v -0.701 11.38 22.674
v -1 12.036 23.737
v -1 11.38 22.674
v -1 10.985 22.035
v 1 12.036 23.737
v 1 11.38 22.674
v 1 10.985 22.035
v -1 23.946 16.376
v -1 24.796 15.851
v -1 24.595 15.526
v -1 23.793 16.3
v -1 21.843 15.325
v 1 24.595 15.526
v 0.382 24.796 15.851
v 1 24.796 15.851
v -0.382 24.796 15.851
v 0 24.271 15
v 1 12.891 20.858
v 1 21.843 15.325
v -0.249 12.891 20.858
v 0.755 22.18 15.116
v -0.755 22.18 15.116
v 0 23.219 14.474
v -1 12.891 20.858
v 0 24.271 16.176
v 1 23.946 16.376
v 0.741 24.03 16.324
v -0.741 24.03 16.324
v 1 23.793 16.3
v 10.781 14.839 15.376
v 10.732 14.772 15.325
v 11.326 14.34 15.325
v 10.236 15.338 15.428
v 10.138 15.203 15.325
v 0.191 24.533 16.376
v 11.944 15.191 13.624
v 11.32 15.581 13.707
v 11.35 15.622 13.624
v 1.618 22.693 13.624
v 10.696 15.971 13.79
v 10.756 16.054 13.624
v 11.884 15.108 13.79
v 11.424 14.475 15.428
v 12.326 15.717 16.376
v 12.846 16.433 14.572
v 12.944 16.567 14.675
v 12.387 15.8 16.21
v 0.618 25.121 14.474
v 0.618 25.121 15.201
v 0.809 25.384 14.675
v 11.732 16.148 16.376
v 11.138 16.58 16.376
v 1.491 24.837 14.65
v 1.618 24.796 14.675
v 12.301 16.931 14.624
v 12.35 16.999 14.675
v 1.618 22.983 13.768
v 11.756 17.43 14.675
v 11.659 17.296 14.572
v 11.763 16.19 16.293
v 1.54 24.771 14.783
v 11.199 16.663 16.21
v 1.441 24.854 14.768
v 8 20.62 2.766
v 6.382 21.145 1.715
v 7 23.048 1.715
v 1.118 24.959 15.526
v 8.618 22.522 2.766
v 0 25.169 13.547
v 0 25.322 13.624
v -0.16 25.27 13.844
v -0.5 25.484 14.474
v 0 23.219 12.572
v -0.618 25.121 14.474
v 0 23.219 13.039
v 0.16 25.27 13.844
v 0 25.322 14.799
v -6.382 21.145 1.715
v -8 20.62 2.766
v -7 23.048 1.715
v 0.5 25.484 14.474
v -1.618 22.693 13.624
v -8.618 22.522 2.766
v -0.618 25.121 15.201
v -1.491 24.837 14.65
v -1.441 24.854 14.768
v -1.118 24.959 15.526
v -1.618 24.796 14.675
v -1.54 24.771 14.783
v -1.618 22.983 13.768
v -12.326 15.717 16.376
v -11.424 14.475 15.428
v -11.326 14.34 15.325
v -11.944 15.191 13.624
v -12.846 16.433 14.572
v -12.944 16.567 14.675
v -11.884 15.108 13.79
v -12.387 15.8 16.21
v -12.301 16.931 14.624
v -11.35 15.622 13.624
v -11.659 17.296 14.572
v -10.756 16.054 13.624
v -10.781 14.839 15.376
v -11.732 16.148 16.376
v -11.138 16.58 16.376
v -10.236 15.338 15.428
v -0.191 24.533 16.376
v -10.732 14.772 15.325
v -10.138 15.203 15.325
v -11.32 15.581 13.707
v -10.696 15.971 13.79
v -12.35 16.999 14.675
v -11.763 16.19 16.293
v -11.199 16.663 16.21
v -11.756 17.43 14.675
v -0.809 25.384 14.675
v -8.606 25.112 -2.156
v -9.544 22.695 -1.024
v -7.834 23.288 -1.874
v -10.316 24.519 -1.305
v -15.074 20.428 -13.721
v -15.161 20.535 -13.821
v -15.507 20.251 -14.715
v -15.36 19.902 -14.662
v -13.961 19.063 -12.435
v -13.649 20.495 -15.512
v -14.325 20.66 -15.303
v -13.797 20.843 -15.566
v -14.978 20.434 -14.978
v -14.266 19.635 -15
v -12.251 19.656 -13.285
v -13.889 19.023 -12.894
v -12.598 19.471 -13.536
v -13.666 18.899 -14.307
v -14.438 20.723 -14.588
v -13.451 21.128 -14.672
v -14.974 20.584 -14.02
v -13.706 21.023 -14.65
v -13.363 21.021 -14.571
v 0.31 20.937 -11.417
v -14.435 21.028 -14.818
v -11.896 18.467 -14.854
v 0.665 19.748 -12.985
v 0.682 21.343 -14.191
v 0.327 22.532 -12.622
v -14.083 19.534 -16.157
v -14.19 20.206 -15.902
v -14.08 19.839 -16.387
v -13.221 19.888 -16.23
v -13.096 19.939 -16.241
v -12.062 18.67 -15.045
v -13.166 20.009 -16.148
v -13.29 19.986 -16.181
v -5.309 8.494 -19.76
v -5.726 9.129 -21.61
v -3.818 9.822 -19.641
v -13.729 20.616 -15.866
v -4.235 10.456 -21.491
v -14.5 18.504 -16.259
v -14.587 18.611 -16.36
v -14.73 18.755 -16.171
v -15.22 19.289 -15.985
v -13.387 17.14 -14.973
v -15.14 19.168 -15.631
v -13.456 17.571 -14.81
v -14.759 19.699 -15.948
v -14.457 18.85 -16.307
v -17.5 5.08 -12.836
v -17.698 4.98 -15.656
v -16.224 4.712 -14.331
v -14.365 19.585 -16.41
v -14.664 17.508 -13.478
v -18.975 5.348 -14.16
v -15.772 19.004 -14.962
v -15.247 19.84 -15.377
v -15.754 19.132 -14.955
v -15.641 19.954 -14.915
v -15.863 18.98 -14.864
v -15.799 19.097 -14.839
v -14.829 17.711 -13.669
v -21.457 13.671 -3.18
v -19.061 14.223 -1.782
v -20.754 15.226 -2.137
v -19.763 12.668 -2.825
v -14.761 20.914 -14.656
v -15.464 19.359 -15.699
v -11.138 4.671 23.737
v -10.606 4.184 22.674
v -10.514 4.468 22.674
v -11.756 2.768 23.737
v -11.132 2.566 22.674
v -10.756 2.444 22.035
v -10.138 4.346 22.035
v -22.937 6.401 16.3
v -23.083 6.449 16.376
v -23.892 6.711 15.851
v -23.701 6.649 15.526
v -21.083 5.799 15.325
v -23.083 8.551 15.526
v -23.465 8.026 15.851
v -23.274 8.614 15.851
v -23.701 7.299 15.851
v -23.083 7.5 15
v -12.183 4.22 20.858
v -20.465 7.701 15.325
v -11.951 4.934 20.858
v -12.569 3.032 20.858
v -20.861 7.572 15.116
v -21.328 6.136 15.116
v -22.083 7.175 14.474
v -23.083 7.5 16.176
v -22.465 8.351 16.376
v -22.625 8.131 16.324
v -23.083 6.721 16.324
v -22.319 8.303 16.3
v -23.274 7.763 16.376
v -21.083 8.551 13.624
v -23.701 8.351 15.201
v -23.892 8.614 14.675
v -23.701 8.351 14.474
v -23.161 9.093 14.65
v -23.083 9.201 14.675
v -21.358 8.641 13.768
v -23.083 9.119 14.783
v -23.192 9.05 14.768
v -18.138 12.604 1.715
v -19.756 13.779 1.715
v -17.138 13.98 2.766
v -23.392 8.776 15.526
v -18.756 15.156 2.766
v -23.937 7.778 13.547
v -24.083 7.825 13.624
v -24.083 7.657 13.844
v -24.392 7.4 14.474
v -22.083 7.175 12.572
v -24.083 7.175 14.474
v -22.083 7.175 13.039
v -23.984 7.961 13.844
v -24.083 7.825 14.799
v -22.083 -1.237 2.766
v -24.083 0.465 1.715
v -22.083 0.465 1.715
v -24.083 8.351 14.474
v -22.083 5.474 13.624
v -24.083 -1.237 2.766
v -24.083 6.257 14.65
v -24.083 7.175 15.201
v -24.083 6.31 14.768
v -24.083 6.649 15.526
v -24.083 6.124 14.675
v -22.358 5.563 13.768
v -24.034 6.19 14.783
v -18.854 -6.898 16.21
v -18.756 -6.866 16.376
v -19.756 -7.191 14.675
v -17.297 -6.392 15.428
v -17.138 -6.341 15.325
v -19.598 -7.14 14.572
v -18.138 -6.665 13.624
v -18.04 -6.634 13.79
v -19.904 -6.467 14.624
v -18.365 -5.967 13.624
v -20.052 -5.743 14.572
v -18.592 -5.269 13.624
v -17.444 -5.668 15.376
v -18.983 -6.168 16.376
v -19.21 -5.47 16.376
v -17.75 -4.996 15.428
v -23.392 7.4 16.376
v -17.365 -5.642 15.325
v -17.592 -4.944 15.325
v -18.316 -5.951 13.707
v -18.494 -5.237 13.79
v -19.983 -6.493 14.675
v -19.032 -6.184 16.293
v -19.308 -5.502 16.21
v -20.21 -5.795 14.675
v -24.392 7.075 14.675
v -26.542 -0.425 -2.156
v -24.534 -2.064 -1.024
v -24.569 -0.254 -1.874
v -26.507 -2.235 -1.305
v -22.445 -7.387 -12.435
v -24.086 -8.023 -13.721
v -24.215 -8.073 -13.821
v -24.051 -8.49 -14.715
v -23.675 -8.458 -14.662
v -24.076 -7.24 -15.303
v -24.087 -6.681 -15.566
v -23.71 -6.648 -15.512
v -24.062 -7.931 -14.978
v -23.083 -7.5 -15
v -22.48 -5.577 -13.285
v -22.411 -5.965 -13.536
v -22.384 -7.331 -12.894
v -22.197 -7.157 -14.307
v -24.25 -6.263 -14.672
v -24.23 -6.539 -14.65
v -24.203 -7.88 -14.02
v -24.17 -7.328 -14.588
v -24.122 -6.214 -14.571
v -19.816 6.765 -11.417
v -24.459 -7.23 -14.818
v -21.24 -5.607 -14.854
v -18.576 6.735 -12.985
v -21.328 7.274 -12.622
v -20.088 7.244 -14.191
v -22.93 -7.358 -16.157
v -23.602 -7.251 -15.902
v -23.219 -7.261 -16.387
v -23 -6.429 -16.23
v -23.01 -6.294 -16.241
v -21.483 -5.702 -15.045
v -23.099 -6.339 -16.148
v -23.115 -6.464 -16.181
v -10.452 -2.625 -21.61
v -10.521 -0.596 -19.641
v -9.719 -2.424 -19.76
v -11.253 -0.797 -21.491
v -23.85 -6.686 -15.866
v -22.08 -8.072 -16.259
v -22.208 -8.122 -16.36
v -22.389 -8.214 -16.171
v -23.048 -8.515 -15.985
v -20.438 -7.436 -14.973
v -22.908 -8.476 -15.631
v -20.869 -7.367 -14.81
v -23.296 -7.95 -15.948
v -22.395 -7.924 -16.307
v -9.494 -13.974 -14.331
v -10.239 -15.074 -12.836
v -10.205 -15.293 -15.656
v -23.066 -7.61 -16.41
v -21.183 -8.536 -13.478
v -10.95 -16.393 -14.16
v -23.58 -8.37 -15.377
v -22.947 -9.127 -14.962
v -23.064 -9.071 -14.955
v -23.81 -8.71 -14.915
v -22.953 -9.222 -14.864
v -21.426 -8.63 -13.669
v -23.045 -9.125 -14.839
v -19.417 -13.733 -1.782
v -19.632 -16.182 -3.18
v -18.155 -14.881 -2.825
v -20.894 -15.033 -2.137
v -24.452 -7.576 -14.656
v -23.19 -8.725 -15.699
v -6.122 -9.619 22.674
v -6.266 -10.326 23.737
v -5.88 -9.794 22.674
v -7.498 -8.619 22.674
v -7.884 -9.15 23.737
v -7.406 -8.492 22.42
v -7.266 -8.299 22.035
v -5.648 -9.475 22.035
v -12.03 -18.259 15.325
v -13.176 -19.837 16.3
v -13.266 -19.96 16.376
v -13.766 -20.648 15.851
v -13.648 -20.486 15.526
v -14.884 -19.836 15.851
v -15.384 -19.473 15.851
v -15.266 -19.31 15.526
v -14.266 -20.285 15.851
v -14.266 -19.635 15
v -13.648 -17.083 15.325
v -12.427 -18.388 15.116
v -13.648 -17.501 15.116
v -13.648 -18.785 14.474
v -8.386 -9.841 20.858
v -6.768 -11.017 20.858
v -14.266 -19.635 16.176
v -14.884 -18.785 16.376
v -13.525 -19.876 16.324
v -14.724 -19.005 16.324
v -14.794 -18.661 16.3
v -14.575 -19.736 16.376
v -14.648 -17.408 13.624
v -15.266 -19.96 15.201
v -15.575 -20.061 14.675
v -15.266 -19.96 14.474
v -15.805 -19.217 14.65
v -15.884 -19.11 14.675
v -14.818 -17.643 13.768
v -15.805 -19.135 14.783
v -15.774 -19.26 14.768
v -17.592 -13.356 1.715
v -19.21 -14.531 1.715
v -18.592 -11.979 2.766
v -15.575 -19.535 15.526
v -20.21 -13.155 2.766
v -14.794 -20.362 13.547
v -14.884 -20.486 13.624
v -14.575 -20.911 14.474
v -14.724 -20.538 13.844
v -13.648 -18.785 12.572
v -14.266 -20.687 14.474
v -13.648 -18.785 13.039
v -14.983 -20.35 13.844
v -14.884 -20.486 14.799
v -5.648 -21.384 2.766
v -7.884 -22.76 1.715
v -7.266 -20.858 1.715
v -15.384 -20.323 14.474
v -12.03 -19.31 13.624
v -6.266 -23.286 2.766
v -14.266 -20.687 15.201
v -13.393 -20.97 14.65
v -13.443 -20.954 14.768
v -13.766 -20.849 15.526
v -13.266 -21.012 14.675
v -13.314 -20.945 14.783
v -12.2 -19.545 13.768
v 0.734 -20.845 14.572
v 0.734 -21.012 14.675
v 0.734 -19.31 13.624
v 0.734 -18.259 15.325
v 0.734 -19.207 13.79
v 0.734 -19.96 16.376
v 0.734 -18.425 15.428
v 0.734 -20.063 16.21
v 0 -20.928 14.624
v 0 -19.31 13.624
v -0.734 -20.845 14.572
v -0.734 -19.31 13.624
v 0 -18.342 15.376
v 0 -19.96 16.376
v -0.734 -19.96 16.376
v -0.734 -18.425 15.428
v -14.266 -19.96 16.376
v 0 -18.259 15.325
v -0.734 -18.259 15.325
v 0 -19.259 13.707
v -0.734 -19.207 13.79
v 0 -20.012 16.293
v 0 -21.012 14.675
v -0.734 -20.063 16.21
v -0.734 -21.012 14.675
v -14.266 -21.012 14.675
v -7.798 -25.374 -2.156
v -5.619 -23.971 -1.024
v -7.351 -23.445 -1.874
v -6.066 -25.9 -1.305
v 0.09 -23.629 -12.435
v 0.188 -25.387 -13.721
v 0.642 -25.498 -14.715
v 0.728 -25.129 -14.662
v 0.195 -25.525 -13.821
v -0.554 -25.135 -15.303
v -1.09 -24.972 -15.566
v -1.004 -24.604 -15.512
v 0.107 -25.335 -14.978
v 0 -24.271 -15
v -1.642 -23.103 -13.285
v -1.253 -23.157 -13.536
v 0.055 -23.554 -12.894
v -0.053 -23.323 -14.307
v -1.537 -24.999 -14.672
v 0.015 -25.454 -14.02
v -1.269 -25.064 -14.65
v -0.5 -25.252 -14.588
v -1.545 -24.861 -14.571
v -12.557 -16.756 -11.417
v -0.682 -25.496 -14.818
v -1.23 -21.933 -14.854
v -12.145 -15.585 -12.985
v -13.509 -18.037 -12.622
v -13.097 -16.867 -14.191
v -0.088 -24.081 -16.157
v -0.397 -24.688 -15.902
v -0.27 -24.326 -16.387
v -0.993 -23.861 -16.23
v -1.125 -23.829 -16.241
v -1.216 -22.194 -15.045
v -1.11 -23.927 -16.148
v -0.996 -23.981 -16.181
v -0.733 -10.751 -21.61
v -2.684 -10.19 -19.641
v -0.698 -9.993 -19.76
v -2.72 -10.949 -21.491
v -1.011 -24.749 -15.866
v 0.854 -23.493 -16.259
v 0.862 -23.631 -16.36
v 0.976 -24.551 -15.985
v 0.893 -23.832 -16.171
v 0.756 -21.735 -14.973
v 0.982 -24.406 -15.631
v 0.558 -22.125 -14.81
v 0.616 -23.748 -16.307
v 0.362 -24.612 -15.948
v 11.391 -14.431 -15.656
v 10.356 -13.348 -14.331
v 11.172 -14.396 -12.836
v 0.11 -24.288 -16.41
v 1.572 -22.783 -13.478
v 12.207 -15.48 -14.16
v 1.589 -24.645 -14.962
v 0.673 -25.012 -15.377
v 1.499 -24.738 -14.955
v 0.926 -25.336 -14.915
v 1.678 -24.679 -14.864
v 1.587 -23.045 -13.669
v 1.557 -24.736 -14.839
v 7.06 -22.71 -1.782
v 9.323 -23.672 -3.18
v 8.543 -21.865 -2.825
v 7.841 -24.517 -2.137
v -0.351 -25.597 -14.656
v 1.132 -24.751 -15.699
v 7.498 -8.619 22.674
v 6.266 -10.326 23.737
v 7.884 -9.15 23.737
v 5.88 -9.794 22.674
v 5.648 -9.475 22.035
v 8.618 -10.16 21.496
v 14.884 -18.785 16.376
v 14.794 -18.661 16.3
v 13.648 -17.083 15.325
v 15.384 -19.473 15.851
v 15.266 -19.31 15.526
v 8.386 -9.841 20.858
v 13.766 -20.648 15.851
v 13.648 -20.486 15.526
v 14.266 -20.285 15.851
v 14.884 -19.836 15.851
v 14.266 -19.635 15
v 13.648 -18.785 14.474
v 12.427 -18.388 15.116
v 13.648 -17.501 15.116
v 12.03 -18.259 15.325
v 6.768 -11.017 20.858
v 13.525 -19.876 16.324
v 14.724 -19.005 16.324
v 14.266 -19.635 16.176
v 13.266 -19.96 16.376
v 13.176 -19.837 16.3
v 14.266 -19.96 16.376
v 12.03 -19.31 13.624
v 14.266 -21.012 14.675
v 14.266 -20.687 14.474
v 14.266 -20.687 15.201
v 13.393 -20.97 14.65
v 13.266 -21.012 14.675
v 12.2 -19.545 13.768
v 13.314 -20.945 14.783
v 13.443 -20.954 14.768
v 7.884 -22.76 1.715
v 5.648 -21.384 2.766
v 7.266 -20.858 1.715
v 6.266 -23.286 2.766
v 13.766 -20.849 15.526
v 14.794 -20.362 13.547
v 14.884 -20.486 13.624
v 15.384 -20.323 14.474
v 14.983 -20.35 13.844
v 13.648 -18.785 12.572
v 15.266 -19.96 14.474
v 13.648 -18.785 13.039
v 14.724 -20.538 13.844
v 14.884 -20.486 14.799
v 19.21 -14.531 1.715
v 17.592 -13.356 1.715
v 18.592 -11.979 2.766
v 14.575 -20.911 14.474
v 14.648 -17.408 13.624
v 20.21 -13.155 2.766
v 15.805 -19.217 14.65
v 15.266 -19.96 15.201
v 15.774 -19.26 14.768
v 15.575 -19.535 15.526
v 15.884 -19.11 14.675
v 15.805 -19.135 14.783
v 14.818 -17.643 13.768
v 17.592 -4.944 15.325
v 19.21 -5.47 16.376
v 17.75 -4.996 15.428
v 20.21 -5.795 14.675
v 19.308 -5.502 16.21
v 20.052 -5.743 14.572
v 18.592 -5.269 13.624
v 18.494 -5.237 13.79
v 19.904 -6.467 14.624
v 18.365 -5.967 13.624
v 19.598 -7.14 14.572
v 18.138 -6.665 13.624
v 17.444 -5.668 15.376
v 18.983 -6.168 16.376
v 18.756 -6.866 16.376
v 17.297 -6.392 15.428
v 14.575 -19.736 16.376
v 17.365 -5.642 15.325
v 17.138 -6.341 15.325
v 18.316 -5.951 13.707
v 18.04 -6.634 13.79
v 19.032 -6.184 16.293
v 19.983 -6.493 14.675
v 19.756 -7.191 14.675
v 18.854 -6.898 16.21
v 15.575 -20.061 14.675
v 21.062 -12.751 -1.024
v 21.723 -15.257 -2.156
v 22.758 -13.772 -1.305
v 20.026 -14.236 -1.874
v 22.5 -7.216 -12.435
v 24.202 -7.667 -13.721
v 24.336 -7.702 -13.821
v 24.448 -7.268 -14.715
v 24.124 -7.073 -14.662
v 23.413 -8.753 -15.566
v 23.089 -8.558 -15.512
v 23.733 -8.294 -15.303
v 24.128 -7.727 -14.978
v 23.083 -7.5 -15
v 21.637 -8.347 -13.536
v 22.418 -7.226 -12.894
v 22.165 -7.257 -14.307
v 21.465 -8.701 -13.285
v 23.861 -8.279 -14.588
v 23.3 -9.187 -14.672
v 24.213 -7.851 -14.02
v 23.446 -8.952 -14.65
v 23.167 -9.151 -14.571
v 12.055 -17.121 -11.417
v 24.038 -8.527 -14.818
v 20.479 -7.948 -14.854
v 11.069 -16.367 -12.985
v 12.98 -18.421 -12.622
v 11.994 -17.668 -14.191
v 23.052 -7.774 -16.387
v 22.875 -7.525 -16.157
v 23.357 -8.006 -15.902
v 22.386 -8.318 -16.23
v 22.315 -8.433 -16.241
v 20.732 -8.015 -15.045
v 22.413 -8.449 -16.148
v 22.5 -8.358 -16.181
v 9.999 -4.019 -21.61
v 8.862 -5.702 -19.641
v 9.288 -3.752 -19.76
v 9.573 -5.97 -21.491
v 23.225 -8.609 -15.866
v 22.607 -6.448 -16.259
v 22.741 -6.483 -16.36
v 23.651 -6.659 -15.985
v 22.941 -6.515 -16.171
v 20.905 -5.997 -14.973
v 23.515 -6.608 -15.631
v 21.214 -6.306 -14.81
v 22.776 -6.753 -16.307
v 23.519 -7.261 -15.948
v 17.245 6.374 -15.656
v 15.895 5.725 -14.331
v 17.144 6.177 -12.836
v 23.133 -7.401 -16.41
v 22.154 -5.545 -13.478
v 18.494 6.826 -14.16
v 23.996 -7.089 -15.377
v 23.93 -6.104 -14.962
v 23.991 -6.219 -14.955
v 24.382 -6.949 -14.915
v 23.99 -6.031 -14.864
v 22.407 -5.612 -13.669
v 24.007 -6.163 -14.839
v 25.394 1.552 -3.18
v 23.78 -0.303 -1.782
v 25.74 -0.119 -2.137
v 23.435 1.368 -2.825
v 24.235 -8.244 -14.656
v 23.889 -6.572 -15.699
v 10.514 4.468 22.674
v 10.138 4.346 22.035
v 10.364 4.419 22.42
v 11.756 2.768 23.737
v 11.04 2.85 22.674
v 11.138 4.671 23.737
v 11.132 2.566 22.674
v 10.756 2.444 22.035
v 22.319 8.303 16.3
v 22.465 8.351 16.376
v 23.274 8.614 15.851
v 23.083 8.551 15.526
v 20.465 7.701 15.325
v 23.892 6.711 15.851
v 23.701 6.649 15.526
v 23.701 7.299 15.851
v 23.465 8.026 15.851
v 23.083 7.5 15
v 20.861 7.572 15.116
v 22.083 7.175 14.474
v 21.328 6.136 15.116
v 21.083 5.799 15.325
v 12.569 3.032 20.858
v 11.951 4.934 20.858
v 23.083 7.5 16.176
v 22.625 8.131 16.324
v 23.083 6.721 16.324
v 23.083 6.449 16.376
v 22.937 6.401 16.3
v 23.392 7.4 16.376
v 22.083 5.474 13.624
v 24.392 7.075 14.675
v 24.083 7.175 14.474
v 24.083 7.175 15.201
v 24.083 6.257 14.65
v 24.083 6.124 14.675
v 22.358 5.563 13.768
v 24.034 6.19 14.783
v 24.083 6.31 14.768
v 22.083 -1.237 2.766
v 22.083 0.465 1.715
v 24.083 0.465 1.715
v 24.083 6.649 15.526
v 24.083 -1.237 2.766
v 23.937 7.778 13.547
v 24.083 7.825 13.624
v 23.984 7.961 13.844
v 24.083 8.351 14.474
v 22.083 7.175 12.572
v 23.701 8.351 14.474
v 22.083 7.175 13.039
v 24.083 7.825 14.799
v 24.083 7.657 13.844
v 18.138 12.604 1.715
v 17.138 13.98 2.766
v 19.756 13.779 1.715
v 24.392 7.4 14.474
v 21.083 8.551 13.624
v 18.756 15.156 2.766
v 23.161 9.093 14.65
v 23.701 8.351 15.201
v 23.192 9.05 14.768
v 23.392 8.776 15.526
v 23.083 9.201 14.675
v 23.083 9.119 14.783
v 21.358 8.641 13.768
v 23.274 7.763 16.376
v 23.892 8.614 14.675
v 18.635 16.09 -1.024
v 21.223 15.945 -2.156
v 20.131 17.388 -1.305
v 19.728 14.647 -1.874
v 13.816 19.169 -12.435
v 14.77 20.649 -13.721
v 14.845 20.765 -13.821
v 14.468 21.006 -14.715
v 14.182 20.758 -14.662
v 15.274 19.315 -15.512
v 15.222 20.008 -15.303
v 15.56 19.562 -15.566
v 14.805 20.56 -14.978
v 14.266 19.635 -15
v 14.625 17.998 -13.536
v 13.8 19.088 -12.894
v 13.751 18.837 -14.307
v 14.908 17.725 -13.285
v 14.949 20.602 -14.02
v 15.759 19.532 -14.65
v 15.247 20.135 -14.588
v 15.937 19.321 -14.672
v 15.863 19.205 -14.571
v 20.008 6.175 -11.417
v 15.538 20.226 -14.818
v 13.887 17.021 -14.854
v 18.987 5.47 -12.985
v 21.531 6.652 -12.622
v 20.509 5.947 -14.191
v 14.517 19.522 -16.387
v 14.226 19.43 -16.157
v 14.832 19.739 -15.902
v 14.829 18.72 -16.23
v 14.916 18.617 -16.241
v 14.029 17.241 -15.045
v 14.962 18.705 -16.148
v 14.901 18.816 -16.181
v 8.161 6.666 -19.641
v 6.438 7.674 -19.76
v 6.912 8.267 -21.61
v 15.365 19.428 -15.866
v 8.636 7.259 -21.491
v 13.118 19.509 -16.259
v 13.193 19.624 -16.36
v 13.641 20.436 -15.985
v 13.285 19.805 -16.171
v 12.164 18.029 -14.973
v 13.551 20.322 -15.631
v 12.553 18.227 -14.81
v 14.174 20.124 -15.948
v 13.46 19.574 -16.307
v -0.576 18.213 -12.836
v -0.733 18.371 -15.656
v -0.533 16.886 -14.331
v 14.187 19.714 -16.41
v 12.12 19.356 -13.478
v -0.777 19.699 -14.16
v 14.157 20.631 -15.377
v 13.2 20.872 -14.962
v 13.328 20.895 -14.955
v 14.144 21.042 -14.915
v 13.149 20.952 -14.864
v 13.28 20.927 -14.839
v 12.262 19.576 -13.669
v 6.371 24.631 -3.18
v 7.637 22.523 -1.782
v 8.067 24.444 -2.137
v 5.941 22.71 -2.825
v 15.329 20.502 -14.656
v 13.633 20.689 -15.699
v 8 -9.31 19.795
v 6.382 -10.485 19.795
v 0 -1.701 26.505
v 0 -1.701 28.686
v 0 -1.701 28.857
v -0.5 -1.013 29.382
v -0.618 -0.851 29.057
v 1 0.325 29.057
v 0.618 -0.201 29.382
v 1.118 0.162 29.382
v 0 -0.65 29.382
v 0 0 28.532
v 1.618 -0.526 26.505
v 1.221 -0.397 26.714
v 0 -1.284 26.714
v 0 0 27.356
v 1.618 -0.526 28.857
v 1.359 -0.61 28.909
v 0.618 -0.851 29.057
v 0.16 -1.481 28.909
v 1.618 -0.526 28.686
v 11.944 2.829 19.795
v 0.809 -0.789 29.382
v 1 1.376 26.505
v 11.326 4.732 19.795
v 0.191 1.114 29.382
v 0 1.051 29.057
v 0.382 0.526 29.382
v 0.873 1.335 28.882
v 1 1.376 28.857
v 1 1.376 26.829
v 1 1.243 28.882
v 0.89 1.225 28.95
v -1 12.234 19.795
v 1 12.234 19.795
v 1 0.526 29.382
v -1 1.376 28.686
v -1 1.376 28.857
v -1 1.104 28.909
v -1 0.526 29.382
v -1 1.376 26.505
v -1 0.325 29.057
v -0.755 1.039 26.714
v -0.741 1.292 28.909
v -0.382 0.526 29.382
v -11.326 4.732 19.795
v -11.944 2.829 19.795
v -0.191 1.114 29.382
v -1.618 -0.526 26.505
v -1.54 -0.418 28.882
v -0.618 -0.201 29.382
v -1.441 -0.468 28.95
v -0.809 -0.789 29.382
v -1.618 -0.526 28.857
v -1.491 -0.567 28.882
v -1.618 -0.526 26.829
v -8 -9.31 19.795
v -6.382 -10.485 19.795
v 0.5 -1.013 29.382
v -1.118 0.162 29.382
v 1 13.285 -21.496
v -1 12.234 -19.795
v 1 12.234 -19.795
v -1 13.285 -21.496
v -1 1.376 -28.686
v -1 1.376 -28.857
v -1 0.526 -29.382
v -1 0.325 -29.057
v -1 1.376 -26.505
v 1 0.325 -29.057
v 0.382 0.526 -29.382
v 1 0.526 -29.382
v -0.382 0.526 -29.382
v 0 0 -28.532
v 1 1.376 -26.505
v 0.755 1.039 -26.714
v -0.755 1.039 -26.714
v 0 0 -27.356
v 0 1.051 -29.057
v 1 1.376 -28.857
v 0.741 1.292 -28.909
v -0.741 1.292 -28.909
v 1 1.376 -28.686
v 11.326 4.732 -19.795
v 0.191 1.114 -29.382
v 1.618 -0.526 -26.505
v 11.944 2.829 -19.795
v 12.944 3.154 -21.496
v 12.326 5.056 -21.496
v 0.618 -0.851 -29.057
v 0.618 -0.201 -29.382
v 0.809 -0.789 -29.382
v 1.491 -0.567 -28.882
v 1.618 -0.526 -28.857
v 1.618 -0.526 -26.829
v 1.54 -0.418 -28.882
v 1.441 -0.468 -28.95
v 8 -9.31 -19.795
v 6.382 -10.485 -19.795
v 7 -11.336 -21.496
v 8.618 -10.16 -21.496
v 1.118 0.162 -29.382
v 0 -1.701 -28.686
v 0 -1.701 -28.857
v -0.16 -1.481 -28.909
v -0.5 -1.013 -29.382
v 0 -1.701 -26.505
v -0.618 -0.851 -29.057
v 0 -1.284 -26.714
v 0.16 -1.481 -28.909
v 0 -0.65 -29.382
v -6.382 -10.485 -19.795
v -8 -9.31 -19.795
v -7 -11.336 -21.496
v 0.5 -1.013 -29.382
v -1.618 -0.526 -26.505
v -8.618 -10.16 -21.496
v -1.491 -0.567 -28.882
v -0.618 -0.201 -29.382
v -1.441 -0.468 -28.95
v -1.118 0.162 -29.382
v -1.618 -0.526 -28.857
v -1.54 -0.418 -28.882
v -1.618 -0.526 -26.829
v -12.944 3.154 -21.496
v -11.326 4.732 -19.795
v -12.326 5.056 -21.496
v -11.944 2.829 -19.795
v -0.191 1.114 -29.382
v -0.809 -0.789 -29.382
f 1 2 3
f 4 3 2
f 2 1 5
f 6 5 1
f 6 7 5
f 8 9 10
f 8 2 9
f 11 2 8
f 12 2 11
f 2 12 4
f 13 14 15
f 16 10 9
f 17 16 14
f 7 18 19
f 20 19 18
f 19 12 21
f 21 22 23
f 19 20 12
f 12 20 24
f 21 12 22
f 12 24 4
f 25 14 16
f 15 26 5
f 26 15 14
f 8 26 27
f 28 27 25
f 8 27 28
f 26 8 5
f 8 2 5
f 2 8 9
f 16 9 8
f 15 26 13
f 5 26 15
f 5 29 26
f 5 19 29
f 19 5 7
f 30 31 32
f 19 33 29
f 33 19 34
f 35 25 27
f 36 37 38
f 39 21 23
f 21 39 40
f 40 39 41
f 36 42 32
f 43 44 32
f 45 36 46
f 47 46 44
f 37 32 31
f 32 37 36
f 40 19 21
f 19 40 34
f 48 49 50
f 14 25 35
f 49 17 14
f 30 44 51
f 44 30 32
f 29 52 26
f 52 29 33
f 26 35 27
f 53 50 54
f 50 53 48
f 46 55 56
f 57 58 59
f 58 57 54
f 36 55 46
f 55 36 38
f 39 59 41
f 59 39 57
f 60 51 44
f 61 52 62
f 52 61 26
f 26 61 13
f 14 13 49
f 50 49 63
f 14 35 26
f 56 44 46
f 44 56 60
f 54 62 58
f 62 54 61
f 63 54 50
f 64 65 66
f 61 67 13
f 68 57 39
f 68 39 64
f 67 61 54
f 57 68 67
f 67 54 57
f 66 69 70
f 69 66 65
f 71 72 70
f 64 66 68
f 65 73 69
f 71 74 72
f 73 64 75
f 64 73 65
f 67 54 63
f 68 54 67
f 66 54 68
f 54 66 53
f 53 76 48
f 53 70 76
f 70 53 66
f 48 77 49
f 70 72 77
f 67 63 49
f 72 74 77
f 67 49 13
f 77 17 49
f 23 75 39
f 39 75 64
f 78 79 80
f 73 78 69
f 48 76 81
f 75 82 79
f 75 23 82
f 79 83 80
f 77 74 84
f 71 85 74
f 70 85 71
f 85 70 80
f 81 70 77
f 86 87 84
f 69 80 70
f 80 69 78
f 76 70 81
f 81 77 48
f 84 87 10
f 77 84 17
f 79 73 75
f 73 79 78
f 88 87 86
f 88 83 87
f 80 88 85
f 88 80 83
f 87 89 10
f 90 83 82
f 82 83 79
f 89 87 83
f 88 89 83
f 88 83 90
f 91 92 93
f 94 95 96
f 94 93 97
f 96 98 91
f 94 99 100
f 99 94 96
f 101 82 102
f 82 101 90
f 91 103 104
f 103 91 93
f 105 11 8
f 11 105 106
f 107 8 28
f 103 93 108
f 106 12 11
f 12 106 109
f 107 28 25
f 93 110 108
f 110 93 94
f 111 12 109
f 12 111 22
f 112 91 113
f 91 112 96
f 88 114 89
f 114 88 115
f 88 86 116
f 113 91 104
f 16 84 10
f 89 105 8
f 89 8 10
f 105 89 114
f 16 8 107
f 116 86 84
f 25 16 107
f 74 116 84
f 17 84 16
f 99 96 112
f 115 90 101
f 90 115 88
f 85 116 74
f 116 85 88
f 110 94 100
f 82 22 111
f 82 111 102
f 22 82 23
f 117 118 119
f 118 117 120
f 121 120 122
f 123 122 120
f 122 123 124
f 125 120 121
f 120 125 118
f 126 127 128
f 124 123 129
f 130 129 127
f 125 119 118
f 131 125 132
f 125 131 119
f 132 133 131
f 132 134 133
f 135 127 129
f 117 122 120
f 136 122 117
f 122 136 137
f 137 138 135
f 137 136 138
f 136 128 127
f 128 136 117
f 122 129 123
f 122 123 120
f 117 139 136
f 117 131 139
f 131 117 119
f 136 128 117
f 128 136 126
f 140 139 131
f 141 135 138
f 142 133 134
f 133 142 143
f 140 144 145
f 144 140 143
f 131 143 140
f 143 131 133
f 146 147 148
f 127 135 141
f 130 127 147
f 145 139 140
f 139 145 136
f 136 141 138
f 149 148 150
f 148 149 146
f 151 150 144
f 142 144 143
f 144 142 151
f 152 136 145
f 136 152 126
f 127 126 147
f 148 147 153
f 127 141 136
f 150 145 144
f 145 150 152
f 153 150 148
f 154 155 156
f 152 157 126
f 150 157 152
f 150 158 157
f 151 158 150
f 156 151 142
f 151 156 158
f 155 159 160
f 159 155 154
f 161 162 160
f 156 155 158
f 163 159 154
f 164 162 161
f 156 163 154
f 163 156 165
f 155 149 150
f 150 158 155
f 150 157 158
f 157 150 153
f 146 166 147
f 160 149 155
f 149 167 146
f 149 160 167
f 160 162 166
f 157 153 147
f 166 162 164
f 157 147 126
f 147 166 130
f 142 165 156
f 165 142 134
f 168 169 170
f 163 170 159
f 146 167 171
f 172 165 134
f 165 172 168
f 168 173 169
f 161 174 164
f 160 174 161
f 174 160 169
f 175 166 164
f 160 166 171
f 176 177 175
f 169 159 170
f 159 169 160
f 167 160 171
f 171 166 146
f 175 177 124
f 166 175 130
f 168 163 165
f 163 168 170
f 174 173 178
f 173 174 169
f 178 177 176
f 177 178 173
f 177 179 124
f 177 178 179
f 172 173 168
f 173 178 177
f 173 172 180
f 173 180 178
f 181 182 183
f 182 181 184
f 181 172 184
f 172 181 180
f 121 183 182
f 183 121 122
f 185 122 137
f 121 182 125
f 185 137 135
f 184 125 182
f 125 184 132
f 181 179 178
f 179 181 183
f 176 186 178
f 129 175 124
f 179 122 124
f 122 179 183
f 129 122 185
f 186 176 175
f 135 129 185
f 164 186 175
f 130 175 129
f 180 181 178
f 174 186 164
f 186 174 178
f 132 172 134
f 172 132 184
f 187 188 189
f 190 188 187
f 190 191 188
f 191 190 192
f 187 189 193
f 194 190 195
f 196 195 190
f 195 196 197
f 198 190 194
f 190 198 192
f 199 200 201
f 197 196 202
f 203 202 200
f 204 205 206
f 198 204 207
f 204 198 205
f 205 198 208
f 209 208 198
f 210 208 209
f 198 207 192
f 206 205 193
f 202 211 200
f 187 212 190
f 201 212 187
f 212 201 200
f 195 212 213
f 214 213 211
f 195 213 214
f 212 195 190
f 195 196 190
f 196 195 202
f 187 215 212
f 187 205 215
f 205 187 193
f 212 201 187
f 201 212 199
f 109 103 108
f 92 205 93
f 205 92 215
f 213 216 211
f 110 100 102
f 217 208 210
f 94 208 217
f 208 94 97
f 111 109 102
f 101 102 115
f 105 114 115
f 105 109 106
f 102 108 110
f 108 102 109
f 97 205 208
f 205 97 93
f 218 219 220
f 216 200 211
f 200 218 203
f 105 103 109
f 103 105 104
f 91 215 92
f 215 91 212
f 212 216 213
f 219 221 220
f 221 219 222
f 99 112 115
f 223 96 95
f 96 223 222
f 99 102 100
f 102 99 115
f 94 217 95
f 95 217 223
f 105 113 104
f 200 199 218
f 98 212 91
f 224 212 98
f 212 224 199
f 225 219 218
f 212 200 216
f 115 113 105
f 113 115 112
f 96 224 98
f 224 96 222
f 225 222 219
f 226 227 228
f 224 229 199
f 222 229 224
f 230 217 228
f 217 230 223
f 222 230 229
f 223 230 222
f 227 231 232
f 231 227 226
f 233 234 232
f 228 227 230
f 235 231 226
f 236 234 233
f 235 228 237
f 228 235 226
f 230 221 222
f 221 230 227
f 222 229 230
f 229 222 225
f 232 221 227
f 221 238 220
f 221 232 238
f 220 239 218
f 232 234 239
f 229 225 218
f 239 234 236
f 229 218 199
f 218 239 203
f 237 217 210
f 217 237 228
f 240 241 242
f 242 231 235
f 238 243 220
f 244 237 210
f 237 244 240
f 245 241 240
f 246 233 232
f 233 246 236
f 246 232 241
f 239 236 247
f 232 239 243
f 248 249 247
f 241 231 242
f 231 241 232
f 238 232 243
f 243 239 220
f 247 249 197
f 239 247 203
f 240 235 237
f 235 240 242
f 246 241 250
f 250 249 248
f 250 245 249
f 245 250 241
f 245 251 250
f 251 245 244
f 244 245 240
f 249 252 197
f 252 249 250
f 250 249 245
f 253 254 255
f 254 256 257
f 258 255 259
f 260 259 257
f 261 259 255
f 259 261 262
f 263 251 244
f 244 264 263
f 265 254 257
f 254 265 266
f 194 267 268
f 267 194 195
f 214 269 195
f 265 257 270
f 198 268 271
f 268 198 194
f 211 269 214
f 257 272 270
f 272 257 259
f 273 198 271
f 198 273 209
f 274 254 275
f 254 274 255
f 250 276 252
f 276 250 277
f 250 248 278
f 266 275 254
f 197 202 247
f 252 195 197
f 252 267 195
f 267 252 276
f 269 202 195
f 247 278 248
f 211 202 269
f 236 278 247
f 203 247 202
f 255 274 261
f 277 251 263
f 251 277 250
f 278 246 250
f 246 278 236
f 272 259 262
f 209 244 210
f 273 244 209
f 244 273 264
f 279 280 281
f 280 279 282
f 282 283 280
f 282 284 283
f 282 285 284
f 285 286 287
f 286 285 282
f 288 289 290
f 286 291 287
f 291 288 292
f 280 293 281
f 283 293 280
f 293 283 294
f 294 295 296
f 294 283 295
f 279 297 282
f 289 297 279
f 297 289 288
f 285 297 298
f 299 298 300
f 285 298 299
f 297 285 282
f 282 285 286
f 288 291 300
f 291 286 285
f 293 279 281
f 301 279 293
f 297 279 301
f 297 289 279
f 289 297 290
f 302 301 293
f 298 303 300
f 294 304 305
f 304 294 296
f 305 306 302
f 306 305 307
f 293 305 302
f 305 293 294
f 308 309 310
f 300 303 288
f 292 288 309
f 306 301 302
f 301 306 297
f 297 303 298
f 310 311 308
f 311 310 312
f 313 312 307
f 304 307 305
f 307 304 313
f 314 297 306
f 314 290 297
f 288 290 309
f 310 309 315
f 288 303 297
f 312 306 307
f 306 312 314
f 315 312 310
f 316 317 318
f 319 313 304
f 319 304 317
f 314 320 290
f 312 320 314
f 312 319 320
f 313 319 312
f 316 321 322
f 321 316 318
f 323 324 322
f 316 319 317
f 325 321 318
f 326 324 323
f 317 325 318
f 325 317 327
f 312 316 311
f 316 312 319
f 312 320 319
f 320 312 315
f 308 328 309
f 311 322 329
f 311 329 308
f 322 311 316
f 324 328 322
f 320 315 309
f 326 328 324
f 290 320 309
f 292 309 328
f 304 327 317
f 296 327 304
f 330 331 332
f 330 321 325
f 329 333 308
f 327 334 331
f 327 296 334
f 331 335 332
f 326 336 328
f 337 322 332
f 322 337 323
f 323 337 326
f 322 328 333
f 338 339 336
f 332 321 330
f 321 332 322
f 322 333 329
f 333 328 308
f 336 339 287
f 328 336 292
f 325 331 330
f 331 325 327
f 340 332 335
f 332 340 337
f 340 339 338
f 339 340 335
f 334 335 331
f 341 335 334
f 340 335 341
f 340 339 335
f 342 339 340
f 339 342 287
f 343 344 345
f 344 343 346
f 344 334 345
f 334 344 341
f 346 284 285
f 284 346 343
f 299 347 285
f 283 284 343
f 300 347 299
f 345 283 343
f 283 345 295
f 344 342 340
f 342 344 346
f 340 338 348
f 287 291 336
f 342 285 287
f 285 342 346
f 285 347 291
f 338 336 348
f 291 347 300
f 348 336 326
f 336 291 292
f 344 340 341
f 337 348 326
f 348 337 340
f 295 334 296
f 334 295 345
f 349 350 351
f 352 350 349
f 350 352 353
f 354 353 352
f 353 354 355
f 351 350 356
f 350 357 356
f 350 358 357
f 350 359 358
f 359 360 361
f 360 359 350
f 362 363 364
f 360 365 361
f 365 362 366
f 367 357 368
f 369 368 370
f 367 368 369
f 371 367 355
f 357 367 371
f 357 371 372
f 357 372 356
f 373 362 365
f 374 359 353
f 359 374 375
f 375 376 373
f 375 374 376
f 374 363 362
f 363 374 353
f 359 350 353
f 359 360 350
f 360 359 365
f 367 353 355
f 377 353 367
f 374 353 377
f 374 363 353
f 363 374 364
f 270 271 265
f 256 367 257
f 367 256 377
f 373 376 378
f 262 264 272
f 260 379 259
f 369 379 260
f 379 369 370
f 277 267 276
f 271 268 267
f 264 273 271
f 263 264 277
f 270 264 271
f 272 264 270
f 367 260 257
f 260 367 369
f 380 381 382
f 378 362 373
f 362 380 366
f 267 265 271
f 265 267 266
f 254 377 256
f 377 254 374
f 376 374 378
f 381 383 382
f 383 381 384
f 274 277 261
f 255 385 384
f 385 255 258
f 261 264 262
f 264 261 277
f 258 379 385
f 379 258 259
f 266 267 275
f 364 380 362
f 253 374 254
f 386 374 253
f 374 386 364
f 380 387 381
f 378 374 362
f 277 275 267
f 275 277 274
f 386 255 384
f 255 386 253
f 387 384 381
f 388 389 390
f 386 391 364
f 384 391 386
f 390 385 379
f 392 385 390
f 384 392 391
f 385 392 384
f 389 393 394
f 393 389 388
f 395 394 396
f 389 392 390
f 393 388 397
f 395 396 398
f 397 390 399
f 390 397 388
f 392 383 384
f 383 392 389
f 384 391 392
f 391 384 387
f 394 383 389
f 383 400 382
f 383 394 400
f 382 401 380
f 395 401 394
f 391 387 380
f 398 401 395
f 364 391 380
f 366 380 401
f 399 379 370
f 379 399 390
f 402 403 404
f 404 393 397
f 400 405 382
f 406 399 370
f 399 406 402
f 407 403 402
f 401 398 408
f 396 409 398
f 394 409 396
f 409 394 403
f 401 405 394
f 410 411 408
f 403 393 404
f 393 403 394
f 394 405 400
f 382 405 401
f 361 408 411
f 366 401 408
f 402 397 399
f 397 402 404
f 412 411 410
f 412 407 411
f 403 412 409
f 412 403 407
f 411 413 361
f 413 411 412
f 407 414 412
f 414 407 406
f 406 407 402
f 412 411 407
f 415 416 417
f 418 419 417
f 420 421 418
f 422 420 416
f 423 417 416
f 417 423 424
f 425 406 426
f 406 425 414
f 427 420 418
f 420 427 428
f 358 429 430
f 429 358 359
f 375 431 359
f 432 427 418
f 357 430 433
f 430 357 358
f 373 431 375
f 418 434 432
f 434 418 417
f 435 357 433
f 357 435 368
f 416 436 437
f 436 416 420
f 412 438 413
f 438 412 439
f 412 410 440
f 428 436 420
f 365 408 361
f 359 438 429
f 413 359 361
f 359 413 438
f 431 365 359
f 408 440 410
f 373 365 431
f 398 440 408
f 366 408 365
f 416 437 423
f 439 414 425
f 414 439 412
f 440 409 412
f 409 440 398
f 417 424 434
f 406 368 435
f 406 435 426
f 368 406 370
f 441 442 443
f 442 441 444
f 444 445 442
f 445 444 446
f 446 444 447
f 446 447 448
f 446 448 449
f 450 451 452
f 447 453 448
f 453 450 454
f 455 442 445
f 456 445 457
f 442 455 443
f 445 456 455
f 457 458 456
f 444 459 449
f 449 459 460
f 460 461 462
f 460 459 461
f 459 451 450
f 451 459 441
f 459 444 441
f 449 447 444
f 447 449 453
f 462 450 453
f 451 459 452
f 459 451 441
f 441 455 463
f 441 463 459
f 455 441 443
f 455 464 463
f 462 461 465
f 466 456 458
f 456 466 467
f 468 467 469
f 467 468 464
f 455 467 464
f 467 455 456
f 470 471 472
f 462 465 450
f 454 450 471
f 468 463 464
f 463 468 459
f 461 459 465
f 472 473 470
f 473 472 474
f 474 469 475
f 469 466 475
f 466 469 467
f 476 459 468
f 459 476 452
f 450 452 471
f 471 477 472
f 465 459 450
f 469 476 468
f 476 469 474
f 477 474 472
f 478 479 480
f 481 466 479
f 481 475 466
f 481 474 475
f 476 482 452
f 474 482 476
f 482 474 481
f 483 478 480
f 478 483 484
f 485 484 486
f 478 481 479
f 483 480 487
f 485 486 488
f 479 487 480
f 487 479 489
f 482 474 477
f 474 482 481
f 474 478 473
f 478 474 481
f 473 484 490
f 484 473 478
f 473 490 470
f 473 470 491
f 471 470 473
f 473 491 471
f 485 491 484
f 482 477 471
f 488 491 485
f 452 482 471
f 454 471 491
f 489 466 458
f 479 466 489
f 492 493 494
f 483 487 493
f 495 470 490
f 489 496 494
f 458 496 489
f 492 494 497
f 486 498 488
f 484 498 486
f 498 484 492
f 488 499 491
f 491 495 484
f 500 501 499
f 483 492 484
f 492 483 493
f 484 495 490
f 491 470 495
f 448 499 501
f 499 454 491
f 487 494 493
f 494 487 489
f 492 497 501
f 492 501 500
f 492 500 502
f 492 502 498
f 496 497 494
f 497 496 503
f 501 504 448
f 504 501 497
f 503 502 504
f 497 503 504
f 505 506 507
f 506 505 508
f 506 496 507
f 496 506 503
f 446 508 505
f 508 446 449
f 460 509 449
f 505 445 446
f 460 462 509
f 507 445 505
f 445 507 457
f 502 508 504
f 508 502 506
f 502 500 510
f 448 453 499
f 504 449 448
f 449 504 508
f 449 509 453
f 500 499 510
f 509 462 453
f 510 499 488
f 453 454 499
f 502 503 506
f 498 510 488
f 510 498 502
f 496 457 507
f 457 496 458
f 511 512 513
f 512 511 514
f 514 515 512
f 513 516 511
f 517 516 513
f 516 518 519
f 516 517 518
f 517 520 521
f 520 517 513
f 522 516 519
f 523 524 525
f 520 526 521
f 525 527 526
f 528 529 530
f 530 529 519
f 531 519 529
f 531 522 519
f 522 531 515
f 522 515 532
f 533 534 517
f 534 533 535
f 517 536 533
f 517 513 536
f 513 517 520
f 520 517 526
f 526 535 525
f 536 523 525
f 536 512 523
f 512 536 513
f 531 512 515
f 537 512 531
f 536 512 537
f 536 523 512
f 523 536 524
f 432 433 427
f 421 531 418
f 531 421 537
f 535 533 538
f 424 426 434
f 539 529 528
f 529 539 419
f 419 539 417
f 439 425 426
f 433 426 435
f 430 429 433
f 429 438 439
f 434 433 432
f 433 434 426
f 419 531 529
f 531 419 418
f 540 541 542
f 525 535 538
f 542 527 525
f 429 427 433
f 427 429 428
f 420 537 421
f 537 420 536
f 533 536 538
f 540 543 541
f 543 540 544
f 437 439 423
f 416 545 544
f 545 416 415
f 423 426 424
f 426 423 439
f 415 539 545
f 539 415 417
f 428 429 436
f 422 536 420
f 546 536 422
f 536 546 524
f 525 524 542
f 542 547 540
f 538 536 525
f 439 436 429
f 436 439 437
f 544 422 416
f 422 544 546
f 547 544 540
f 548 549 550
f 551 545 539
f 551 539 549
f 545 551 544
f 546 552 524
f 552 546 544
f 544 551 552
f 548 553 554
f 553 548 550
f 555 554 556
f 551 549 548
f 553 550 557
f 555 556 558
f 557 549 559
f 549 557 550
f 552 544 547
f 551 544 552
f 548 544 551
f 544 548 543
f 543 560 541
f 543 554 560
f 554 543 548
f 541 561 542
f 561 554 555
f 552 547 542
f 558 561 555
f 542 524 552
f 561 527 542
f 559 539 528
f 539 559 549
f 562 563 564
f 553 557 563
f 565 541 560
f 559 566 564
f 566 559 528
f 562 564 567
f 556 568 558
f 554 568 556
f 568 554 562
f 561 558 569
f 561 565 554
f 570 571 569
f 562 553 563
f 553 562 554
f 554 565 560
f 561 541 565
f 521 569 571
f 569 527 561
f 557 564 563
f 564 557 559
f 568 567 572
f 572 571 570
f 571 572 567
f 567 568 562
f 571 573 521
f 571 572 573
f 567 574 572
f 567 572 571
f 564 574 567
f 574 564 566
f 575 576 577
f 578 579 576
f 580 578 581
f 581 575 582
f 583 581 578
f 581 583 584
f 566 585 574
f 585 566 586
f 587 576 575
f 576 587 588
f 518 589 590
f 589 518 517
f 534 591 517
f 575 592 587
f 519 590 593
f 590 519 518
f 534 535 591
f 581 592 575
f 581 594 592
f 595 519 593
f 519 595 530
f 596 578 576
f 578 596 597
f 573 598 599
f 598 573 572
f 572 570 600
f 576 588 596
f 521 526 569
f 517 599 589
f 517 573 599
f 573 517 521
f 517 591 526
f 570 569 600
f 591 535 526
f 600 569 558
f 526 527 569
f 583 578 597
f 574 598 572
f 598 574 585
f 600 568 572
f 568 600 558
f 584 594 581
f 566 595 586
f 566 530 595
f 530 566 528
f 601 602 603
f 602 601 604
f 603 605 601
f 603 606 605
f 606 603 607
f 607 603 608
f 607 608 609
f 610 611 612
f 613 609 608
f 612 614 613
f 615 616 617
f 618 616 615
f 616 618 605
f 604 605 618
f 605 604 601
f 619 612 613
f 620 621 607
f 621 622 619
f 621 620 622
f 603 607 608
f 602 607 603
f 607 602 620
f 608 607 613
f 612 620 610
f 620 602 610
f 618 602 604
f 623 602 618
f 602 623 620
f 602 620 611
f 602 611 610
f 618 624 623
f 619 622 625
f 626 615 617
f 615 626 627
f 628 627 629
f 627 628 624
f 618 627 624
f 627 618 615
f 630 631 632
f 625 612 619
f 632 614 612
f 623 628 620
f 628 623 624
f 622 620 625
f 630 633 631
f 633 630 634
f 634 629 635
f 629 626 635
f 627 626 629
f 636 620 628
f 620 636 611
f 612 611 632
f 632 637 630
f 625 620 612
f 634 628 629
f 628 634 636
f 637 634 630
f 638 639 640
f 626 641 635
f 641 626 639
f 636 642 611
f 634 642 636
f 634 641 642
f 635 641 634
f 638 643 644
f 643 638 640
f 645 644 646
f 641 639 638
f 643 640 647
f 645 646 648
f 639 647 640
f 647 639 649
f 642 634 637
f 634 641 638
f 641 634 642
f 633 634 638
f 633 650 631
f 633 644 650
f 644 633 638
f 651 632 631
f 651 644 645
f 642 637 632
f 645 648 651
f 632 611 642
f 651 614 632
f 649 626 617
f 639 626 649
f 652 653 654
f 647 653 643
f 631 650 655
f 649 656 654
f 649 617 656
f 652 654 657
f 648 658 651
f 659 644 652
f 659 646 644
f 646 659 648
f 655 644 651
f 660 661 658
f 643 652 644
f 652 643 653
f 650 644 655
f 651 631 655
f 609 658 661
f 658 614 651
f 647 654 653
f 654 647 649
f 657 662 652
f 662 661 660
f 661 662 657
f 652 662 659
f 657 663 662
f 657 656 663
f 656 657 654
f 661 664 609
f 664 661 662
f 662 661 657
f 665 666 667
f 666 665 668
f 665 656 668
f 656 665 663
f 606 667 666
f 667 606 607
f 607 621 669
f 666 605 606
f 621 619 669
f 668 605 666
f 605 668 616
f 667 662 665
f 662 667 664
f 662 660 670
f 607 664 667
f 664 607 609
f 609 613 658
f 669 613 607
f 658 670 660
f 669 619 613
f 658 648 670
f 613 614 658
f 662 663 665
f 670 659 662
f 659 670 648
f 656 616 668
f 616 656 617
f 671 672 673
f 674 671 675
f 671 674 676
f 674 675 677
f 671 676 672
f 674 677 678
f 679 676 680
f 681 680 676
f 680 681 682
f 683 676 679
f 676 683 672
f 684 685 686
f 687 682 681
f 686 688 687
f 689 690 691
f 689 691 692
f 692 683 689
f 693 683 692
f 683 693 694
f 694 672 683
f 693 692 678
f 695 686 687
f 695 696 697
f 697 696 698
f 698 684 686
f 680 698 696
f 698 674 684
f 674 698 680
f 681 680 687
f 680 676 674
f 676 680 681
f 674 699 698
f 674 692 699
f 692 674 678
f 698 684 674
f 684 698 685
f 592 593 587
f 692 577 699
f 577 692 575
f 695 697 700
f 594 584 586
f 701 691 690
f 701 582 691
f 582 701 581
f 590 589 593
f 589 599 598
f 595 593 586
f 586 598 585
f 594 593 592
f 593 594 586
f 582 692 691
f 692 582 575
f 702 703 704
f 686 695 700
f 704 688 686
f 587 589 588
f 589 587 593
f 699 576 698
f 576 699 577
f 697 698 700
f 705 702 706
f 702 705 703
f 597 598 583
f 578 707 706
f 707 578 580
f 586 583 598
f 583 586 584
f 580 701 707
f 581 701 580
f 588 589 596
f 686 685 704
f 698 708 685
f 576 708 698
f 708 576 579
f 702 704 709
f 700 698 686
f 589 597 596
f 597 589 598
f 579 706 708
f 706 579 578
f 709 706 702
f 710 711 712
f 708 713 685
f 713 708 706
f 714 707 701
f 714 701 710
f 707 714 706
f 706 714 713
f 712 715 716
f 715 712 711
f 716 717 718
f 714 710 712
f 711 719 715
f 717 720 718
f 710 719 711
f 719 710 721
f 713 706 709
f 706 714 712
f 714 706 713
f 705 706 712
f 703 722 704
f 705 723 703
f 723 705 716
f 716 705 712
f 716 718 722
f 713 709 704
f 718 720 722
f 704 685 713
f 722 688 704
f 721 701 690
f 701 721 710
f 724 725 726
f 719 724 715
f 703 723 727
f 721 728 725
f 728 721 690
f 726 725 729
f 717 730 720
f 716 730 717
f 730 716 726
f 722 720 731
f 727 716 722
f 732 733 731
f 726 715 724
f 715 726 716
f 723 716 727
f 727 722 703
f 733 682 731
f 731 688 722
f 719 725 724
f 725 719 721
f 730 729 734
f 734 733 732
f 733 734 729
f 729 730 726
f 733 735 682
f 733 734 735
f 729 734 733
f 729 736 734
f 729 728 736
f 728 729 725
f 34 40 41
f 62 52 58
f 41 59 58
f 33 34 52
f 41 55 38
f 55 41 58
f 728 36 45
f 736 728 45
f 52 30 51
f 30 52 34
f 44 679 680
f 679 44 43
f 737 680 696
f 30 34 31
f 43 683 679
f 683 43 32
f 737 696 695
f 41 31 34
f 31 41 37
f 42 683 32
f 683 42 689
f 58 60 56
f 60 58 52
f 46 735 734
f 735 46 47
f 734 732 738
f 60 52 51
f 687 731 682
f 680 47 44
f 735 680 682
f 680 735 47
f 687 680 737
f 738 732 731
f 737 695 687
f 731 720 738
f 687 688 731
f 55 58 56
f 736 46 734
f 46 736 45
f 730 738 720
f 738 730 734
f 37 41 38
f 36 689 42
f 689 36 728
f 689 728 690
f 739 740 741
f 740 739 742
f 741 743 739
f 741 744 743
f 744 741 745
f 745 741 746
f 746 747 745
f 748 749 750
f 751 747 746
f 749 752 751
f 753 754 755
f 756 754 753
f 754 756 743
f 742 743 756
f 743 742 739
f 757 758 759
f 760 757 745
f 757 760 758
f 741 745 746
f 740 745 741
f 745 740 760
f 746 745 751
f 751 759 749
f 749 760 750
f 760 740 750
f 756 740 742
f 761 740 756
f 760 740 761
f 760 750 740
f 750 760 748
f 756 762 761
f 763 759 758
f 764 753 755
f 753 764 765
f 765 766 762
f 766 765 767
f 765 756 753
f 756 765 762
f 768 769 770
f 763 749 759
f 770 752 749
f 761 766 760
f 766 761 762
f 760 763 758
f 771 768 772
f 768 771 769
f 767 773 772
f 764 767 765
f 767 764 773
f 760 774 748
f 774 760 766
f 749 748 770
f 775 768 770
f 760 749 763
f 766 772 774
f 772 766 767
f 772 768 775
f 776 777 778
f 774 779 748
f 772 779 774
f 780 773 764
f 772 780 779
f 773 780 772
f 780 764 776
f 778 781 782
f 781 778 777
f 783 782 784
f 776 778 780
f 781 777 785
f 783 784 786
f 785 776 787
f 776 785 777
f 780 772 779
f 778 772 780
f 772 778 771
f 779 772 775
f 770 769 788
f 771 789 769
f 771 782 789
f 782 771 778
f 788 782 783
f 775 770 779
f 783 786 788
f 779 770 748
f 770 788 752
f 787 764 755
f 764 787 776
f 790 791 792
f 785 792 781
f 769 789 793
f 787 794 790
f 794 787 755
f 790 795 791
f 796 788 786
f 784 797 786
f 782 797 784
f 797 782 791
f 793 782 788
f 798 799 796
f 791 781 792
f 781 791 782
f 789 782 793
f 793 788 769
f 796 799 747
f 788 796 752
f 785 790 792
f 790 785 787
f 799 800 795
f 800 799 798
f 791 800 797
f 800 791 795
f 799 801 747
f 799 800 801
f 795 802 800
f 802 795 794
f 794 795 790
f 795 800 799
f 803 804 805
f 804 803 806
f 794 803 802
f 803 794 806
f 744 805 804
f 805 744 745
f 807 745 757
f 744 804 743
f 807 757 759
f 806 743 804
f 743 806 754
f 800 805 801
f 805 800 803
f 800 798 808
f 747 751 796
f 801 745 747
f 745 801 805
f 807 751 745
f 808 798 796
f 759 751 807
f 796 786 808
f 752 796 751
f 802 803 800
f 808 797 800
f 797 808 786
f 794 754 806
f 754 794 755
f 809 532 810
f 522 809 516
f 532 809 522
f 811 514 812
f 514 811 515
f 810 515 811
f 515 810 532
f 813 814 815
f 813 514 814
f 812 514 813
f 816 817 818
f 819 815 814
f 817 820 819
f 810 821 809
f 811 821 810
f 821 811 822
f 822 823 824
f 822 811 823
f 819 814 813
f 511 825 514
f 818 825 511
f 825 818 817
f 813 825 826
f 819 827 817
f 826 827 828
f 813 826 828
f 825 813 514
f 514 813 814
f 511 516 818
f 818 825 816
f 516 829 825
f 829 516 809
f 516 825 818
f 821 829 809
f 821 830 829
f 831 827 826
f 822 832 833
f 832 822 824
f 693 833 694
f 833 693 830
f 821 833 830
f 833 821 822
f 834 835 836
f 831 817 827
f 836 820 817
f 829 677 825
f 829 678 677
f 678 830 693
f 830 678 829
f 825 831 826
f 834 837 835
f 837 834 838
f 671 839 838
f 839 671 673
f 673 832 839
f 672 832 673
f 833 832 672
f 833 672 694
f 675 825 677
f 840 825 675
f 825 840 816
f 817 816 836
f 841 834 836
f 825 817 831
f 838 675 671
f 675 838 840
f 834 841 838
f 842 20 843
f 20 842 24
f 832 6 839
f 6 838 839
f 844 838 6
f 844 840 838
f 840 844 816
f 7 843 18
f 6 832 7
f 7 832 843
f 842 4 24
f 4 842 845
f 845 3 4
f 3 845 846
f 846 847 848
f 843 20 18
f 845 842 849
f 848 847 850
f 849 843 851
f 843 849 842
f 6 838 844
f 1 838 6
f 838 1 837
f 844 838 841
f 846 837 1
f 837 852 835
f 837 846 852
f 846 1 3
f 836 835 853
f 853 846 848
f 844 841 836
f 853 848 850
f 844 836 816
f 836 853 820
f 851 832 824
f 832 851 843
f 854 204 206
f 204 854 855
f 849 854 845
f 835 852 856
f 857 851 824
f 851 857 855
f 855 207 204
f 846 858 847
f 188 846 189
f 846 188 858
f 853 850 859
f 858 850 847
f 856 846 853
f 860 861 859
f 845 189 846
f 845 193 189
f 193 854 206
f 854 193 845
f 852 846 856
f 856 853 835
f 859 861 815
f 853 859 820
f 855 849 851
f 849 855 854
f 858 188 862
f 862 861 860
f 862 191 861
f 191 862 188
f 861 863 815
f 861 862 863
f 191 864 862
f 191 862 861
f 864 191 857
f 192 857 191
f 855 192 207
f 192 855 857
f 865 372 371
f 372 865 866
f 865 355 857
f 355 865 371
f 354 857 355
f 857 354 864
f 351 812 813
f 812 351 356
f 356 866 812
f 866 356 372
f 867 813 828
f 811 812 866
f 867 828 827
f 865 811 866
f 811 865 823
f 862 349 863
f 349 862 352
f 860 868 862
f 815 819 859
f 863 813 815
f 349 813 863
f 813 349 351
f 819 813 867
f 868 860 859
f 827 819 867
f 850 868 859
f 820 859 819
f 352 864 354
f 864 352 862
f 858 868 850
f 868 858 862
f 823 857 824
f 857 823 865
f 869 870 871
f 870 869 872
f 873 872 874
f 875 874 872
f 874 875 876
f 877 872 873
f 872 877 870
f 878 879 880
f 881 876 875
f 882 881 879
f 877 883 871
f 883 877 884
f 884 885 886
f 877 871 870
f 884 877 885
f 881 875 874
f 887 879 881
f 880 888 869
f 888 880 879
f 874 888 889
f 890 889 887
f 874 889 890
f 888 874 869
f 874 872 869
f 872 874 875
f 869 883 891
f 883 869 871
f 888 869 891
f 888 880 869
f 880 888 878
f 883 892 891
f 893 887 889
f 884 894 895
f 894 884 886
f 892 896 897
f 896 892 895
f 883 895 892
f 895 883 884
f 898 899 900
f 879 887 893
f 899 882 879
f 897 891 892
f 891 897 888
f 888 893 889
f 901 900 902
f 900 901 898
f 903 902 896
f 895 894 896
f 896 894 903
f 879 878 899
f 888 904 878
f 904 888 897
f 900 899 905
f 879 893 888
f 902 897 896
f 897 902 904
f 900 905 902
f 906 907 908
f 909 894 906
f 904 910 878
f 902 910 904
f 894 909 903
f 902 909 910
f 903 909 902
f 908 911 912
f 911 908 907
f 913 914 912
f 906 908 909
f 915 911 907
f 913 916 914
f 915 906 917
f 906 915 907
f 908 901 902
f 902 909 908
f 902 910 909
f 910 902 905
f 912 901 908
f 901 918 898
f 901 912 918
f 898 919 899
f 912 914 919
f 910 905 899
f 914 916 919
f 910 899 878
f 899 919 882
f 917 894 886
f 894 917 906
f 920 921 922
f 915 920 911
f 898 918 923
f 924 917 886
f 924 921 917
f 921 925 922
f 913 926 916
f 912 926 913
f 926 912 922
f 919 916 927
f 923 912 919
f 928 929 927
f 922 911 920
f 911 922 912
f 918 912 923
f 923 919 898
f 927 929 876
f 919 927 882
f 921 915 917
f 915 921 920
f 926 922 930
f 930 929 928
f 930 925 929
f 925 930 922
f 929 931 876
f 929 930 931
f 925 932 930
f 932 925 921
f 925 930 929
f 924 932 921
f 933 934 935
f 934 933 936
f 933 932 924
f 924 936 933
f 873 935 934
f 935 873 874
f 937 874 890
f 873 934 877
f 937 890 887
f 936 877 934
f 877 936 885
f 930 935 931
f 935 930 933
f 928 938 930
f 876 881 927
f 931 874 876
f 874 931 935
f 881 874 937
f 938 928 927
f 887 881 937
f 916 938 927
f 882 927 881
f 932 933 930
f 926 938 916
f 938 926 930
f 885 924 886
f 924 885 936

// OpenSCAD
side = 30;
phi = (1+sqrt(5))/2;
// dihedral angle
di = 2*asin(phi/sqrt(3));

// distance to vertex
dv = side*0.951056517;
// central angle
ca = 63.4349488;

module triangle(radius)
{
	o=radius/2; //equivalent to radius*sin(30)
	a=radius*sqrt(3)/2; //equivalent to radius*cos(30)
	polygon(points=[[-a,-o],[0,radius],[a,-o]],paths=[[0,1,2]]);
}

module reg_polygon(sides,radius)
{
function dia(r) = sqrt(pow(r*2,2)/2); //sqrt(r*2^2/2) if only we had an exponention op
if(sides<2) square([radius,0]);
if(sides==3) triangle(radius);
if(sides==4) square([dia(radius),dia(radius)],center=true);
if(sides>4) circle(r=radius,$fn=sides);
}
module pentagon(radius)
{
	reg_polygon(5,radius);
}

module node() {
	for ( i = [0 : 4] ) {
		rotate([90+31.71747441, 0, i * 360 / 5])
		translate([-1,-1,0])
		cube([2,2,15]);
	}
	//sphere(3);
}

for ( i = [0 : 4] )
{
	rotate([ca/2, 0, i * 360 / 5])
	rotate([0,0,0]) translate([0, dv, 0]) rotate([-(ca/2+ca),0,0]) {
		node();	
	}
	
	// todo: where did we get 36
	//rotate([-ca/2, 0, (i * 360 / 5)+36])
	rotate([-ca/2, 0, (i * 360 / 5)+36])
	translate([0, dv, 0]) rotate([-(ca/2+ca),30,0]) {
		node();
	}
}

// top
translate([0, 0, dv]) {
	rotate([0,0,36])
	node();
}
	
// bottom
translate([0, 0, -dv]) {
	rotate([180,0,0]) {
		node();
	}
}
